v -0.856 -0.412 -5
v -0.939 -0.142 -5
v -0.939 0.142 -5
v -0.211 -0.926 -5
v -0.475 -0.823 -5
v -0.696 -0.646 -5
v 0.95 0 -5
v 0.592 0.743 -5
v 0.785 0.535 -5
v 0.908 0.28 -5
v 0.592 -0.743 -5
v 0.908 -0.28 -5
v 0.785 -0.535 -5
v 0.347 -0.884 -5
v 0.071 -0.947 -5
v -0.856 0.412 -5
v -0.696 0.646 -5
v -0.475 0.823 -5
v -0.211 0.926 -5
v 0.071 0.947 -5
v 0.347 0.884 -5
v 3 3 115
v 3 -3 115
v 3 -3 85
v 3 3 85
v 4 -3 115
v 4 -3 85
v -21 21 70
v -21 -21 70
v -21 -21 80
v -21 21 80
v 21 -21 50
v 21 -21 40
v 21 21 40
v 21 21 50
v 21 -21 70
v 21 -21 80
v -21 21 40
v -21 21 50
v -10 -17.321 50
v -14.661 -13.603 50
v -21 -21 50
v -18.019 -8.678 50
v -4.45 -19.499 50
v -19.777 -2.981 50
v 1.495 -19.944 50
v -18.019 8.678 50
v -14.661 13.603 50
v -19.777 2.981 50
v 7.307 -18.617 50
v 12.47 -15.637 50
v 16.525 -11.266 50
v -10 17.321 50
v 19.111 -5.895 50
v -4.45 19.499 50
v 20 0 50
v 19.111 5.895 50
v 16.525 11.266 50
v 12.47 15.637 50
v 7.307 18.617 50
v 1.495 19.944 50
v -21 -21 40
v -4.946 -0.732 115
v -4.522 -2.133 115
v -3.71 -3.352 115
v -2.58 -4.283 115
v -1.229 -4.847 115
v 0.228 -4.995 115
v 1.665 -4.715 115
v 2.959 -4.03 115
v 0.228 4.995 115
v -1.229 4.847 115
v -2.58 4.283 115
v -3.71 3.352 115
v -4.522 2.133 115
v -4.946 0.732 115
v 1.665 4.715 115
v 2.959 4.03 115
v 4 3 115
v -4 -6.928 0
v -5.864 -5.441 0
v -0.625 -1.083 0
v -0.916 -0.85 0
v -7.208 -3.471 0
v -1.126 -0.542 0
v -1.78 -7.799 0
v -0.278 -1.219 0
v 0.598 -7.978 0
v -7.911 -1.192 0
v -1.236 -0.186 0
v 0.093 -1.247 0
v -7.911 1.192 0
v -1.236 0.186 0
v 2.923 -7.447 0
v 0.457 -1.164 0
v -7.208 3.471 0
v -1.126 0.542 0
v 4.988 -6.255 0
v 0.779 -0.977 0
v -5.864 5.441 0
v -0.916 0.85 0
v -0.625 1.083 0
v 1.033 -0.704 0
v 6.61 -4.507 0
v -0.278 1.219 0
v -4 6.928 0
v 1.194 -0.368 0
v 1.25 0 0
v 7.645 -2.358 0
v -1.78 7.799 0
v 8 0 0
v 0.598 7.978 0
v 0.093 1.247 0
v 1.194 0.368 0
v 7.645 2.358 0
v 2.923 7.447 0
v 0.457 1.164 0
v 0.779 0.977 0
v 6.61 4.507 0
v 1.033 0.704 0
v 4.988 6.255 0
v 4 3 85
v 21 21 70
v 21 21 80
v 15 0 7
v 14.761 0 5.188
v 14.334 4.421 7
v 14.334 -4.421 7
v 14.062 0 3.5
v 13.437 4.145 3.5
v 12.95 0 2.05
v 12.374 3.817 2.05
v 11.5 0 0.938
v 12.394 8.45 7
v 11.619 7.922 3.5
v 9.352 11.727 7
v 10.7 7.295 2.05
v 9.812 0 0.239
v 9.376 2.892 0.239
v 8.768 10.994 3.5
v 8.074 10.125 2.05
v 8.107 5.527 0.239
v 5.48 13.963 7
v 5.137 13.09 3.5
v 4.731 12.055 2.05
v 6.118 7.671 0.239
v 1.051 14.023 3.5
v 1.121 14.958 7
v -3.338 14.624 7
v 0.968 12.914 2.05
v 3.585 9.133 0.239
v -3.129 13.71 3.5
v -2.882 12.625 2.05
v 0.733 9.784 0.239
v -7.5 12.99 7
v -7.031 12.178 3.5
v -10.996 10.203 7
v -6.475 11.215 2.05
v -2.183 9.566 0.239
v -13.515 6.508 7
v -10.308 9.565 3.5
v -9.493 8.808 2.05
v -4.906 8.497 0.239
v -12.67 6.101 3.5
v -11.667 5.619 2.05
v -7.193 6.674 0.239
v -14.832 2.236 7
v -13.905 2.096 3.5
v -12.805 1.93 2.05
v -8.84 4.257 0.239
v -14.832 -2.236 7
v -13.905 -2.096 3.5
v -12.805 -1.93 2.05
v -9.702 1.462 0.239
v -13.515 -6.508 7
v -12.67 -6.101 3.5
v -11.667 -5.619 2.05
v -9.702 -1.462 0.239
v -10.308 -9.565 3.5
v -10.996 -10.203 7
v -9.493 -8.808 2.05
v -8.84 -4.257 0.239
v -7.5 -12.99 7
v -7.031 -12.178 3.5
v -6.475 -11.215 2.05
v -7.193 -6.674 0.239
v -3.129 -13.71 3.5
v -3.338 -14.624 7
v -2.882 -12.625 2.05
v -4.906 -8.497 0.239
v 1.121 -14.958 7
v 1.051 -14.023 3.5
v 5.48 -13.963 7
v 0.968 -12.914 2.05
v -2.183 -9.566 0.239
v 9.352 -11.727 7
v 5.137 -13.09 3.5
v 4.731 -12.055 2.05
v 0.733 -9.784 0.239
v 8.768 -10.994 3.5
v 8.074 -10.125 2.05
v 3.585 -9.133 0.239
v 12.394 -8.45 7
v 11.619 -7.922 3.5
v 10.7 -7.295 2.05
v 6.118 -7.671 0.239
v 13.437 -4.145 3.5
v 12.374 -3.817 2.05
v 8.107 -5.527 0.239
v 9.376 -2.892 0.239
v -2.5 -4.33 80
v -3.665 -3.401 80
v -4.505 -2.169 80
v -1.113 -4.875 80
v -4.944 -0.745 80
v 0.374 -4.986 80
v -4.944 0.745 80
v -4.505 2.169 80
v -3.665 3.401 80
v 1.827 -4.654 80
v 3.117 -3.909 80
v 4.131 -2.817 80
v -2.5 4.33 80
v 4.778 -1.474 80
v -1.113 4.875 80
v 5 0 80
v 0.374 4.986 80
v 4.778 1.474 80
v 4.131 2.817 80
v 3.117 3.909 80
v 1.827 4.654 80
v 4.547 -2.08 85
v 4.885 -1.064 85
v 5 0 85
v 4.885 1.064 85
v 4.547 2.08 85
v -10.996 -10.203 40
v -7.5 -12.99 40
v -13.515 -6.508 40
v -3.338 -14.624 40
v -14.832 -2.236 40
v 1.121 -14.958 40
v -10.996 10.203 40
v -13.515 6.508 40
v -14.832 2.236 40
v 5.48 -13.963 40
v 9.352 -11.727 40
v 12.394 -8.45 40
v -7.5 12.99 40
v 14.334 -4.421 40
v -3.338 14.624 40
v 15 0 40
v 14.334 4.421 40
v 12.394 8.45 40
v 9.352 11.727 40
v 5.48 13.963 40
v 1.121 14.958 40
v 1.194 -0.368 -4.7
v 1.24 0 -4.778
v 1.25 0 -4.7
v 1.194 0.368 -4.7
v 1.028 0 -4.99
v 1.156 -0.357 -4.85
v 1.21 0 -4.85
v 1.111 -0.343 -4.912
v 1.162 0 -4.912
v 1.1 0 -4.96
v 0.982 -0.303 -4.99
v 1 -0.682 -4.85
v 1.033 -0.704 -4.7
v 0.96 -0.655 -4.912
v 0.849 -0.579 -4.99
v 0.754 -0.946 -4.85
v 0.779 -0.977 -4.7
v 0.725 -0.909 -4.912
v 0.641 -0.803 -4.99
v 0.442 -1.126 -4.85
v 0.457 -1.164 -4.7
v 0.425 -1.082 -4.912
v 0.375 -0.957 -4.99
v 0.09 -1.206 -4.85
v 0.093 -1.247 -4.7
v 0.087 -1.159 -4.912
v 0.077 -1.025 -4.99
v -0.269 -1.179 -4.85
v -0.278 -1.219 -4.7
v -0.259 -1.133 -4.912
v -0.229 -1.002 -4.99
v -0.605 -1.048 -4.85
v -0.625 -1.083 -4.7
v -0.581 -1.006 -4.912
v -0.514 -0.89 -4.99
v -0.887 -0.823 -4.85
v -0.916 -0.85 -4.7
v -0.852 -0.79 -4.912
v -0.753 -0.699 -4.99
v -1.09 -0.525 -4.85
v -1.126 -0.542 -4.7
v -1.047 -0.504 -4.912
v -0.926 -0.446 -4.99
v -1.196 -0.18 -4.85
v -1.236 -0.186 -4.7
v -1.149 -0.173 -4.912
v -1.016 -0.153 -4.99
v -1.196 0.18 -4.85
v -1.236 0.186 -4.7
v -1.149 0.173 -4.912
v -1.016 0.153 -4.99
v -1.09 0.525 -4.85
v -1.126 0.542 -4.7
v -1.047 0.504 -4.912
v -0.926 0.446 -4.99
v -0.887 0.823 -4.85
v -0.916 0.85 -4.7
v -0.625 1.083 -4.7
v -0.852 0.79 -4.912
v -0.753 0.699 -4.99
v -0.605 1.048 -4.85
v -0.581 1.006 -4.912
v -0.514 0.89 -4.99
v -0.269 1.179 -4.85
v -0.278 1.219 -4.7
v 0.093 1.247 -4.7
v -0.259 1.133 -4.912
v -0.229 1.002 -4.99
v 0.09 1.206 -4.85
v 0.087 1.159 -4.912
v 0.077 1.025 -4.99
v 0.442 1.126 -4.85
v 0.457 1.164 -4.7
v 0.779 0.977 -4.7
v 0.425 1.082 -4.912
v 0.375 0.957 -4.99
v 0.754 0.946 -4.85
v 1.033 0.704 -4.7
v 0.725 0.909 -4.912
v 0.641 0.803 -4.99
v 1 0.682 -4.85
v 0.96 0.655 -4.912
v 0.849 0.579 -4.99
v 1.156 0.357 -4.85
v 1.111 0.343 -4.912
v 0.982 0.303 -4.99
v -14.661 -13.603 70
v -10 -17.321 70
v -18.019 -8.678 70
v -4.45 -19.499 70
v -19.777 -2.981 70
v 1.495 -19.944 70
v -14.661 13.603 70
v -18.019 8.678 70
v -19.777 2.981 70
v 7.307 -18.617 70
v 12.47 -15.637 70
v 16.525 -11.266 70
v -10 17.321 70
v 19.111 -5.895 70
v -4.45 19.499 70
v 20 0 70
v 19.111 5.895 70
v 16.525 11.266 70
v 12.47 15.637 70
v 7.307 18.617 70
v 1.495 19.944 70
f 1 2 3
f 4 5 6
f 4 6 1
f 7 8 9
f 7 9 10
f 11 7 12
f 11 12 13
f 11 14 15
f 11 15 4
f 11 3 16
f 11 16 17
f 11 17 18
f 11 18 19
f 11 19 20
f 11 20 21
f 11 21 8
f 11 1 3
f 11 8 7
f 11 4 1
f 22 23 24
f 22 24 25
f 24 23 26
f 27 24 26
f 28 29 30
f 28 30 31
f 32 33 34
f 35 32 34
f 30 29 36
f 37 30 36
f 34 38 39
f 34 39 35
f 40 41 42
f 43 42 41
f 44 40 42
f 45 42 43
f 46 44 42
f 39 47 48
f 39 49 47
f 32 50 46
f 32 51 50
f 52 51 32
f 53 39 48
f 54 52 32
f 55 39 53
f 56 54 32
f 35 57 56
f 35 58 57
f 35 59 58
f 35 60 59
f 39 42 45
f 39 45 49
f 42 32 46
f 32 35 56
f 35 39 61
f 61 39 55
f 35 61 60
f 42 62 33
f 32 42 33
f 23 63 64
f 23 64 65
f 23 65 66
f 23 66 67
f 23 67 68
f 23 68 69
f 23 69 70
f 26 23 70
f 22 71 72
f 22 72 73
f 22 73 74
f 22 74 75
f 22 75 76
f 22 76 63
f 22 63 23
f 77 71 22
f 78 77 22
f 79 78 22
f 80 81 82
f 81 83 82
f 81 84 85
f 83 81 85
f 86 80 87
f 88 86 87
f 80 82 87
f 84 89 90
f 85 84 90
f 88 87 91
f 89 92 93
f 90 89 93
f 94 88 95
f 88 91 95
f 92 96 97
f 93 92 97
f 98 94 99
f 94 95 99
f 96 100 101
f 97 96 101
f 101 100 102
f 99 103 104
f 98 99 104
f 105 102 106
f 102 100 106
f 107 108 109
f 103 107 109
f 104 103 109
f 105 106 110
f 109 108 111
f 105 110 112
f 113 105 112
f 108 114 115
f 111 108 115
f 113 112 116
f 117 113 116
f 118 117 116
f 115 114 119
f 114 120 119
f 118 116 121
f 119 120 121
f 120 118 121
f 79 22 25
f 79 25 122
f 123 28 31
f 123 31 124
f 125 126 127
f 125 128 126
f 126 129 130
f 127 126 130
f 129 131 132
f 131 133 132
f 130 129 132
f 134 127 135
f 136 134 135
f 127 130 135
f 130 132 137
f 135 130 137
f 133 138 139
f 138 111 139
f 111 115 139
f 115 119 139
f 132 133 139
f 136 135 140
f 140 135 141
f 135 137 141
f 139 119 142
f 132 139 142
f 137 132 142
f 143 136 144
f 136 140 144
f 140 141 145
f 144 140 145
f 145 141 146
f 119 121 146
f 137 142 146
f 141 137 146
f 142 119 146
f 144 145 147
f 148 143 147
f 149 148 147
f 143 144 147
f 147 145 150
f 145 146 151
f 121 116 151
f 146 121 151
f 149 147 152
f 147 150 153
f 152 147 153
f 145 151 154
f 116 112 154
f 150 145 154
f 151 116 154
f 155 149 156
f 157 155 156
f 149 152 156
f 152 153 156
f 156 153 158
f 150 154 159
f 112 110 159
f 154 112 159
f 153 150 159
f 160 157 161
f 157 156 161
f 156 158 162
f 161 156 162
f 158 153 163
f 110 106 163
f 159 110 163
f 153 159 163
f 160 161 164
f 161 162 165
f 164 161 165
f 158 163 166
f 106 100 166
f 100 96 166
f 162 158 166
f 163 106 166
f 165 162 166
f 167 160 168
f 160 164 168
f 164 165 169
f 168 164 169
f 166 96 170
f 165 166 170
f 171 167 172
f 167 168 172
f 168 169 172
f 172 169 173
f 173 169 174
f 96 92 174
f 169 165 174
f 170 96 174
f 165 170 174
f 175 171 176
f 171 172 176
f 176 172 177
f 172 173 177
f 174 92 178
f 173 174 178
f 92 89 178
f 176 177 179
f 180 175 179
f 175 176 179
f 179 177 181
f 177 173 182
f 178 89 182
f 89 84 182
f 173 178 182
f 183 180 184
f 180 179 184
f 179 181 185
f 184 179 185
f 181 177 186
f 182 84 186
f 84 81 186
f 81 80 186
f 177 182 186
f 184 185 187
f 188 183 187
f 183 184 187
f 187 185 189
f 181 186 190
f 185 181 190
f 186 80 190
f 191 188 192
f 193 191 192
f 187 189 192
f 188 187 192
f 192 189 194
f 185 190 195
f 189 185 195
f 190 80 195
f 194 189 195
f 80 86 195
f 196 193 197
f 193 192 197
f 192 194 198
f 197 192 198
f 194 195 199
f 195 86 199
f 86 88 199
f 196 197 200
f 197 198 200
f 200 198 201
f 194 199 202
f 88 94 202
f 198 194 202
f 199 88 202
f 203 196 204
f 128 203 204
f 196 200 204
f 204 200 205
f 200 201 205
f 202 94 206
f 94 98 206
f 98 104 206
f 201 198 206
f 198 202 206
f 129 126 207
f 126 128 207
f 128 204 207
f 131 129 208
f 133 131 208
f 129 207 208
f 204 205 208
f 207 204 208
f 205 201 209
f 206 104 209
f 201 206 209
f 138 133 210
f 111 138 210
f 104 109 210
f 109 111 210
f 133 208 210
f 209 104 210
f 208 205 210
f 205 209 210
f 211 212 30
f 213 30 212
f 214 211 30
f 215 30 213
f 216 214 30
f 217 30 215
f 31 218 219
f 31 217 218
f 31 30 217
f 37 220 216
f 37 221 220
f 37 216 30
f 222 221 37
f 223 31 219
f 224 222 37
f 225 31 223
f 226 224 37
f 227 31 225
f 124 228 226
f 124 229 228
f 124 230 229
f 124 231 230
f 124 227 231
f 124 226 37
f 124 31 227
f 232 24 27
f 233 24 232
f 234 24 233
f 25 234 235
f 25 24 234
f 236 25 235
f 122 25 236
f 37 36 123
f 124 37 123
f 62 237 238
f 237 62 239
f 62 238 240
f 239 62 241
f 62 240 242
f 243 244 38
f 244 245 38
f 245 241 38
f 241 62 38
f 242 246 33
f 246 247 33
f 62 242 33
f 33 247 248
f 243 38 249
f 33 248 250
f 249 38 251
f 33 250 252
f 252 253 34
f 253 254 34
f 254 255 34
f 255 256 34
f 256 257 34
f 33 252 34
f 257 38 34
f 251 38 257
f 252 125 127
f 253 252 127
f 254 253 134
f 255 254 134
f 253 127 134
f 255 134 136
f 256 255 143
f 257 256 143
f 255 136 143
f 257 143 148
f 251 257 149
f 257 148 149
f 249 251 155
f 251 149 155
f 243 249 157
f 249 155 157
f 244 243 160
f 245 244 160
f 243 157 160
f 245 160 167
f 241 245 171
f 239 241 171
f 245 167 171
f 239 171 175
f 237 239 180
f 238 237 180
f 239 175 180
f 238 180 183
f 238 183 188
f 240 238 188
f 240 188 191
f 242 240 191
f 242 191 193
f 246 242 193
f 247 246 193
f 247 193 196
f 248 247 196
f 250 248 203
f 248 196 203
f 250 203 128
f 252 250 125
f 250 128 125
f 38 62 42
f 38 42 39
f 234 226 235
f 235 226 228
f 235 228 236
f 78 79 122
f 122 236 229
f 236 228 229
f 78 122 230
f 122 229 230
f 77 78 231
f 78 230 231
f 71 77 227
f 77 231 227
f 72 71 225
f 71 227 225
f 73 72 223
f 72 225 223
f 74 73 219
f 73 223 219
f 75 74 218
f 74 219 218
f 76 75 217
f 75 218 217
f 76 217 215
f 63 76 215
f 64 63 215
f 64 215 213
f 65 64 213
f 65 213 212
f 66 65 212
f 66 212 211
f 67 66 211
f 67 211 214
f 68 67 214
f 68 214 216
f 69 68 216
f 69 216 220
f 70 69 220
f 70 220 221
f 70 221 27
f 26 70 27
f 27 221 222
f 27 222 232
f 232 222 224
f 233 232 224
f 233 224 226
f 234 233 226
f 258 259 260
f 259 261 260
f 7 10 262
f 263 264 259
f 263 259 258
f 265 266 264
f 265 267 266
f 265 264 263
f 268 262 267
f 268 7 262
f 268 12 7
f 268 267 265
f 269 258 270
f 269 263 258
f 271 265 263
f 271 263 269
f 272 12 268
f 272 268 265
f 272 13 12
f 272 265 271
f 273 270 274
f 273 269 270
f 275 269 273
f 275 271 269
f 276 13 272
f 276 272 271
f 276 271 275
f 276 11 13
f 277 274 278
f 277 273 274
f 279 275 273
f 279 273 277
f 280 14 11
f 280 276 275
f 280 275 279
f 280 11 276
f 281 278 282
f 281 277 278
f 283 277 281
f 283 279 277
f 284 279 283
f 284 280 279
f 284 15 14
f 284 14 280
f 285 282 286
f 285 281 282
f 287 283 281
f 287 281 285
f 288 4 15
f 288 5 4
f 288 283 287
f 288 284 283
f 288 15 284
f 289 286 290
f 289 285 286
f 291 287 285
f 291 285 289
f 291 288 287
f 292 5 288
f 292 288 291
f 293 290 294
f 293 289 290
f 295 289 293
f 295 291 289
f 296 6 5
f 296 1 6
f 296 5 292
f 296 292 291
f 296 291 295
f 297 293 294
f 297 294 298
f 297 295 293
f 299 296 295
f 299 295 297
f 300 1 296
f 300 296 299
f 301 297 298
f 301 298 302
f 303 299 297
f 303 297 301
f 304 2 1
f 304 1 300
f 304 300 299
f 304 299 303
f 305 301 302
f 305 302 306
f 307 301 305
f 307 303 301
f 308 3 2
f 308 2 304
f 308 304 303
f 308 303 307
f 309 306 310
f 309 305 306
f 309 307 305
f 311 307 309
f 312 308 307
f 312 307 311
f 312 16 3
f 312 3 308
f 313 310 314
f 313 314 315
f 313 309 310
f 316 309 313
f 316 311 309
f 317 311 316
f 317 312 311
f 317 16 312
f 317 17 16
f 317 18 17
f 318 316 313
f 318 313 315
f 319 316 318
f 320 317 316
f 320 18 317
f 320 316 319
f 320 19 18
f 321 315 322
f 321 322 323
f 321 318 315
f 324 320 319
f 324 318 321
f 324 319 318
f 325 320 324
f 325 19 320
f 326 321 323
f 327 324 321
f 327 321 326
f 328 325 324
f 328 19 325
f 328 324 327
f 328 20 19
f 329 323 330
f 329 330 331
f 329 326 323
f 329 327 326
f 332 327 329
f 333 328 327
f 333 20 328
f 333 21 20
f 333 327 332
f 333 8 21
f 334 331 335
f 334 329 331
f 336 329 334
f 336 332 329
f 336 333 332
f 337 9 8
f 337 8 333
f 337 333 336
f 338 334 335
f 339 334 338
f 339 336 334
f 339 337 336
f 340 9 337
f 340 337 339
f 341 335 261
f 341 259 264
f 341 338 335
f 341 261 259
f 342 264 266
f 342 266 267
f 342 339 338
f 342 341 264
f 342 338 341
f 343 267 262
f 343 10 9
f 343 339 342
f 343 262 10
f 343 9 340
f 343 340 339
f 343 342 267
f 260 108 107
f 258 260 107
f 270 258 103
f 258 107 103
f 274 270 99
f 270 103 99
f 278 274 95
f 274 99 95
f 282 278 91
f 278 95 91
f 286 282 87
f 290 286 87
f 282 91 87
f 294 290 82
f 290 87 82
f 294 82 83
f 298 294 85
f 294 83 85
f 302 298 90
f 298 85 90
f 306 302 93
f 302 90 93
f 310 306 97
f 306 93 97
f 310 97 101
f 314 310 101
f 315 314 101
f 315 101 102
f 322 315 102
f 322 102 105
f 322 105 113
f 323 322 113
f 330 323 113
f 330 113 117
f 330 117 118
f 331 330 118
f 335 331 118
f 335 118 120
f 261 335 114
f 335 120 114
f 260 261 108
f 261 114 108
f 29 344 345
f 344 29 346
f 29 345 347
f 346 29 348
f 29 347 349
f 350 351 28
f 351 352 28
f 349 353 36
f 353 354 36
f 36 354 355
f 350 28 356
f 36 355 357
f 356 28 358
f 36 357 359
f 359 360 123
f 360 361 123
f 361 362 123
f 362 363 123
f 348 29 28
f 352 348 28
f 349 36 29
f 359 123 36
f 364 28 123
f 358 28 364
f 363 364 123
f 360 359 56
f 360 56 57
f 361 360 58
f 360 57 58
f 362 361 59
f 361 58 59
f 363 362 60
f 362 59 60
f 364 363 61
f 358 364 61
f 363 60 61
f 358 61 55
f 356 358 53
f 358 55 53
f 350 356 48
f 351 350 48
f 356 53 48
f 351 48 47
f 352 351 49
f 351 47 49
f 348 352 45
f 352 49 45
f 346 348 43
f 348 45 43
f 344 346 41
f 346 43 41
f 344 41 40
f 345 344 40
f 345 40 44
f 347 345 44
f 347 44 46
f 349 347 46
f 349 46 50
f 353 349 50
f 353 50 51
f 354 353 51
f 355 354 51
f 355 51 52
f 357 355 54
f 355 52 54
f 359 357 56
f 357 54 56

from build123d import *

# Parameters (mm, degrees)
SKETCH1_R           = 15
BOSS_EXTRUDE1_DEPTH = 40
SKETCH2_W           = 42
SKETCH2_H           = 42
BOSS_EXTRUDE4_DEPTH = 10
SKETCH3_R           = 20
BOSS_EXTRUDE5_DEPTH = 20
SKETCH4_W           = 42
SKETCH4_H           = 42
BOSS_EXTRUDE6_DEPTH = 10
SKETCH5_R           = 5
BOSS_EXTRUDE7_DEPTH = 35
FILLET3_R           = 7
SKETCH6_R           = 1.25
BOSS_EXTRUDE8_DEPTH = 5
FILLET5_R           = 0.3
SKETCH7_W           = 4
SKETCH7_H           = 6
CUT_EXTRUDE1_DEPTH  = 30


with BuildPart() as part:
    # Sketch1 → Boss-Extrude1 (new body)
    with BuildSketch(Plane.XY):
        Circle(SKETCH1_R)
    extrude(amount=BOSS_EXTRUDE1_DEPTH)

    # Sketch2 → Boss-Extrude4 (add)
    with BuildSketch(Plane.XY.offset(40)):
        Rectangle(SKETCH2_W, SKETCH2_H)
    extrude(amount=BOSS_EXTRUDE4_DEPTH)

    # Sketch3 → Boss-Extrude5 (add)
    with BuildSketch(Plane.XY.offset(50)):
        Circle(SKETCH3_R)
    extrude(amount=BOSS_EXTRUDE5_DEPTH)

    # Sketch4 → Boss-Extrude6 (add)
    with BuildSketch(Plane.XY.offset(70)):
        Rectangle(SKETCH4_W, SKETCH4_H)
    extrude(amount=BOSS_EXTRUDE6_DEPTH)

    # Sketch5 → Boss-Extrude7 (add)
    with BuildSketch(Plane.XY.offset(80)):
        Circle(SKETCH5_R)
    extrude(amount=BOSS_EXTRUDE7_DEPTH)

    # Fillet3
    fillet3_edges = [part.edges().sort_by_distance(p)[0] for p in [
        (-15, 0, 0),
    ]]
    fillet(fillet3_edges, radius=FILLET3_R)

    # Sketch6 → Boss-Extrude8 (add)
    with BuildSketch(Plane(origin=(0, 0, 0), x_dir=(-1, 0, 0), z_dir=(0, 0, -1))):
        with Locations(Location((0, 0, 0), (0, 0, 180))):
            Circle(SKETCH6_R)
    extrude(amount=BOSS_EXTRUDE8_DEPTH)

    # Fillet5
    fillet5_edges = [part.edges().sort_by_distance(p)[0] for p in [
        (-1.25, 0, -5),
    ]]
    fillet(fillet5_edges, radius=FILLET5_R)

    # Sketch7 → Cut-Extrude1 (cut)
    with BuildSketch(Plane.XY.offset(115)):
        with Locations((5, 0)):
            Rectangle(SKETCH7_W, SKETCH7_H)
    extrude(amount=-CUT_EXTRUDE1_DEPTH, mode=Mode.SUBTRACT)


solid = part.part
